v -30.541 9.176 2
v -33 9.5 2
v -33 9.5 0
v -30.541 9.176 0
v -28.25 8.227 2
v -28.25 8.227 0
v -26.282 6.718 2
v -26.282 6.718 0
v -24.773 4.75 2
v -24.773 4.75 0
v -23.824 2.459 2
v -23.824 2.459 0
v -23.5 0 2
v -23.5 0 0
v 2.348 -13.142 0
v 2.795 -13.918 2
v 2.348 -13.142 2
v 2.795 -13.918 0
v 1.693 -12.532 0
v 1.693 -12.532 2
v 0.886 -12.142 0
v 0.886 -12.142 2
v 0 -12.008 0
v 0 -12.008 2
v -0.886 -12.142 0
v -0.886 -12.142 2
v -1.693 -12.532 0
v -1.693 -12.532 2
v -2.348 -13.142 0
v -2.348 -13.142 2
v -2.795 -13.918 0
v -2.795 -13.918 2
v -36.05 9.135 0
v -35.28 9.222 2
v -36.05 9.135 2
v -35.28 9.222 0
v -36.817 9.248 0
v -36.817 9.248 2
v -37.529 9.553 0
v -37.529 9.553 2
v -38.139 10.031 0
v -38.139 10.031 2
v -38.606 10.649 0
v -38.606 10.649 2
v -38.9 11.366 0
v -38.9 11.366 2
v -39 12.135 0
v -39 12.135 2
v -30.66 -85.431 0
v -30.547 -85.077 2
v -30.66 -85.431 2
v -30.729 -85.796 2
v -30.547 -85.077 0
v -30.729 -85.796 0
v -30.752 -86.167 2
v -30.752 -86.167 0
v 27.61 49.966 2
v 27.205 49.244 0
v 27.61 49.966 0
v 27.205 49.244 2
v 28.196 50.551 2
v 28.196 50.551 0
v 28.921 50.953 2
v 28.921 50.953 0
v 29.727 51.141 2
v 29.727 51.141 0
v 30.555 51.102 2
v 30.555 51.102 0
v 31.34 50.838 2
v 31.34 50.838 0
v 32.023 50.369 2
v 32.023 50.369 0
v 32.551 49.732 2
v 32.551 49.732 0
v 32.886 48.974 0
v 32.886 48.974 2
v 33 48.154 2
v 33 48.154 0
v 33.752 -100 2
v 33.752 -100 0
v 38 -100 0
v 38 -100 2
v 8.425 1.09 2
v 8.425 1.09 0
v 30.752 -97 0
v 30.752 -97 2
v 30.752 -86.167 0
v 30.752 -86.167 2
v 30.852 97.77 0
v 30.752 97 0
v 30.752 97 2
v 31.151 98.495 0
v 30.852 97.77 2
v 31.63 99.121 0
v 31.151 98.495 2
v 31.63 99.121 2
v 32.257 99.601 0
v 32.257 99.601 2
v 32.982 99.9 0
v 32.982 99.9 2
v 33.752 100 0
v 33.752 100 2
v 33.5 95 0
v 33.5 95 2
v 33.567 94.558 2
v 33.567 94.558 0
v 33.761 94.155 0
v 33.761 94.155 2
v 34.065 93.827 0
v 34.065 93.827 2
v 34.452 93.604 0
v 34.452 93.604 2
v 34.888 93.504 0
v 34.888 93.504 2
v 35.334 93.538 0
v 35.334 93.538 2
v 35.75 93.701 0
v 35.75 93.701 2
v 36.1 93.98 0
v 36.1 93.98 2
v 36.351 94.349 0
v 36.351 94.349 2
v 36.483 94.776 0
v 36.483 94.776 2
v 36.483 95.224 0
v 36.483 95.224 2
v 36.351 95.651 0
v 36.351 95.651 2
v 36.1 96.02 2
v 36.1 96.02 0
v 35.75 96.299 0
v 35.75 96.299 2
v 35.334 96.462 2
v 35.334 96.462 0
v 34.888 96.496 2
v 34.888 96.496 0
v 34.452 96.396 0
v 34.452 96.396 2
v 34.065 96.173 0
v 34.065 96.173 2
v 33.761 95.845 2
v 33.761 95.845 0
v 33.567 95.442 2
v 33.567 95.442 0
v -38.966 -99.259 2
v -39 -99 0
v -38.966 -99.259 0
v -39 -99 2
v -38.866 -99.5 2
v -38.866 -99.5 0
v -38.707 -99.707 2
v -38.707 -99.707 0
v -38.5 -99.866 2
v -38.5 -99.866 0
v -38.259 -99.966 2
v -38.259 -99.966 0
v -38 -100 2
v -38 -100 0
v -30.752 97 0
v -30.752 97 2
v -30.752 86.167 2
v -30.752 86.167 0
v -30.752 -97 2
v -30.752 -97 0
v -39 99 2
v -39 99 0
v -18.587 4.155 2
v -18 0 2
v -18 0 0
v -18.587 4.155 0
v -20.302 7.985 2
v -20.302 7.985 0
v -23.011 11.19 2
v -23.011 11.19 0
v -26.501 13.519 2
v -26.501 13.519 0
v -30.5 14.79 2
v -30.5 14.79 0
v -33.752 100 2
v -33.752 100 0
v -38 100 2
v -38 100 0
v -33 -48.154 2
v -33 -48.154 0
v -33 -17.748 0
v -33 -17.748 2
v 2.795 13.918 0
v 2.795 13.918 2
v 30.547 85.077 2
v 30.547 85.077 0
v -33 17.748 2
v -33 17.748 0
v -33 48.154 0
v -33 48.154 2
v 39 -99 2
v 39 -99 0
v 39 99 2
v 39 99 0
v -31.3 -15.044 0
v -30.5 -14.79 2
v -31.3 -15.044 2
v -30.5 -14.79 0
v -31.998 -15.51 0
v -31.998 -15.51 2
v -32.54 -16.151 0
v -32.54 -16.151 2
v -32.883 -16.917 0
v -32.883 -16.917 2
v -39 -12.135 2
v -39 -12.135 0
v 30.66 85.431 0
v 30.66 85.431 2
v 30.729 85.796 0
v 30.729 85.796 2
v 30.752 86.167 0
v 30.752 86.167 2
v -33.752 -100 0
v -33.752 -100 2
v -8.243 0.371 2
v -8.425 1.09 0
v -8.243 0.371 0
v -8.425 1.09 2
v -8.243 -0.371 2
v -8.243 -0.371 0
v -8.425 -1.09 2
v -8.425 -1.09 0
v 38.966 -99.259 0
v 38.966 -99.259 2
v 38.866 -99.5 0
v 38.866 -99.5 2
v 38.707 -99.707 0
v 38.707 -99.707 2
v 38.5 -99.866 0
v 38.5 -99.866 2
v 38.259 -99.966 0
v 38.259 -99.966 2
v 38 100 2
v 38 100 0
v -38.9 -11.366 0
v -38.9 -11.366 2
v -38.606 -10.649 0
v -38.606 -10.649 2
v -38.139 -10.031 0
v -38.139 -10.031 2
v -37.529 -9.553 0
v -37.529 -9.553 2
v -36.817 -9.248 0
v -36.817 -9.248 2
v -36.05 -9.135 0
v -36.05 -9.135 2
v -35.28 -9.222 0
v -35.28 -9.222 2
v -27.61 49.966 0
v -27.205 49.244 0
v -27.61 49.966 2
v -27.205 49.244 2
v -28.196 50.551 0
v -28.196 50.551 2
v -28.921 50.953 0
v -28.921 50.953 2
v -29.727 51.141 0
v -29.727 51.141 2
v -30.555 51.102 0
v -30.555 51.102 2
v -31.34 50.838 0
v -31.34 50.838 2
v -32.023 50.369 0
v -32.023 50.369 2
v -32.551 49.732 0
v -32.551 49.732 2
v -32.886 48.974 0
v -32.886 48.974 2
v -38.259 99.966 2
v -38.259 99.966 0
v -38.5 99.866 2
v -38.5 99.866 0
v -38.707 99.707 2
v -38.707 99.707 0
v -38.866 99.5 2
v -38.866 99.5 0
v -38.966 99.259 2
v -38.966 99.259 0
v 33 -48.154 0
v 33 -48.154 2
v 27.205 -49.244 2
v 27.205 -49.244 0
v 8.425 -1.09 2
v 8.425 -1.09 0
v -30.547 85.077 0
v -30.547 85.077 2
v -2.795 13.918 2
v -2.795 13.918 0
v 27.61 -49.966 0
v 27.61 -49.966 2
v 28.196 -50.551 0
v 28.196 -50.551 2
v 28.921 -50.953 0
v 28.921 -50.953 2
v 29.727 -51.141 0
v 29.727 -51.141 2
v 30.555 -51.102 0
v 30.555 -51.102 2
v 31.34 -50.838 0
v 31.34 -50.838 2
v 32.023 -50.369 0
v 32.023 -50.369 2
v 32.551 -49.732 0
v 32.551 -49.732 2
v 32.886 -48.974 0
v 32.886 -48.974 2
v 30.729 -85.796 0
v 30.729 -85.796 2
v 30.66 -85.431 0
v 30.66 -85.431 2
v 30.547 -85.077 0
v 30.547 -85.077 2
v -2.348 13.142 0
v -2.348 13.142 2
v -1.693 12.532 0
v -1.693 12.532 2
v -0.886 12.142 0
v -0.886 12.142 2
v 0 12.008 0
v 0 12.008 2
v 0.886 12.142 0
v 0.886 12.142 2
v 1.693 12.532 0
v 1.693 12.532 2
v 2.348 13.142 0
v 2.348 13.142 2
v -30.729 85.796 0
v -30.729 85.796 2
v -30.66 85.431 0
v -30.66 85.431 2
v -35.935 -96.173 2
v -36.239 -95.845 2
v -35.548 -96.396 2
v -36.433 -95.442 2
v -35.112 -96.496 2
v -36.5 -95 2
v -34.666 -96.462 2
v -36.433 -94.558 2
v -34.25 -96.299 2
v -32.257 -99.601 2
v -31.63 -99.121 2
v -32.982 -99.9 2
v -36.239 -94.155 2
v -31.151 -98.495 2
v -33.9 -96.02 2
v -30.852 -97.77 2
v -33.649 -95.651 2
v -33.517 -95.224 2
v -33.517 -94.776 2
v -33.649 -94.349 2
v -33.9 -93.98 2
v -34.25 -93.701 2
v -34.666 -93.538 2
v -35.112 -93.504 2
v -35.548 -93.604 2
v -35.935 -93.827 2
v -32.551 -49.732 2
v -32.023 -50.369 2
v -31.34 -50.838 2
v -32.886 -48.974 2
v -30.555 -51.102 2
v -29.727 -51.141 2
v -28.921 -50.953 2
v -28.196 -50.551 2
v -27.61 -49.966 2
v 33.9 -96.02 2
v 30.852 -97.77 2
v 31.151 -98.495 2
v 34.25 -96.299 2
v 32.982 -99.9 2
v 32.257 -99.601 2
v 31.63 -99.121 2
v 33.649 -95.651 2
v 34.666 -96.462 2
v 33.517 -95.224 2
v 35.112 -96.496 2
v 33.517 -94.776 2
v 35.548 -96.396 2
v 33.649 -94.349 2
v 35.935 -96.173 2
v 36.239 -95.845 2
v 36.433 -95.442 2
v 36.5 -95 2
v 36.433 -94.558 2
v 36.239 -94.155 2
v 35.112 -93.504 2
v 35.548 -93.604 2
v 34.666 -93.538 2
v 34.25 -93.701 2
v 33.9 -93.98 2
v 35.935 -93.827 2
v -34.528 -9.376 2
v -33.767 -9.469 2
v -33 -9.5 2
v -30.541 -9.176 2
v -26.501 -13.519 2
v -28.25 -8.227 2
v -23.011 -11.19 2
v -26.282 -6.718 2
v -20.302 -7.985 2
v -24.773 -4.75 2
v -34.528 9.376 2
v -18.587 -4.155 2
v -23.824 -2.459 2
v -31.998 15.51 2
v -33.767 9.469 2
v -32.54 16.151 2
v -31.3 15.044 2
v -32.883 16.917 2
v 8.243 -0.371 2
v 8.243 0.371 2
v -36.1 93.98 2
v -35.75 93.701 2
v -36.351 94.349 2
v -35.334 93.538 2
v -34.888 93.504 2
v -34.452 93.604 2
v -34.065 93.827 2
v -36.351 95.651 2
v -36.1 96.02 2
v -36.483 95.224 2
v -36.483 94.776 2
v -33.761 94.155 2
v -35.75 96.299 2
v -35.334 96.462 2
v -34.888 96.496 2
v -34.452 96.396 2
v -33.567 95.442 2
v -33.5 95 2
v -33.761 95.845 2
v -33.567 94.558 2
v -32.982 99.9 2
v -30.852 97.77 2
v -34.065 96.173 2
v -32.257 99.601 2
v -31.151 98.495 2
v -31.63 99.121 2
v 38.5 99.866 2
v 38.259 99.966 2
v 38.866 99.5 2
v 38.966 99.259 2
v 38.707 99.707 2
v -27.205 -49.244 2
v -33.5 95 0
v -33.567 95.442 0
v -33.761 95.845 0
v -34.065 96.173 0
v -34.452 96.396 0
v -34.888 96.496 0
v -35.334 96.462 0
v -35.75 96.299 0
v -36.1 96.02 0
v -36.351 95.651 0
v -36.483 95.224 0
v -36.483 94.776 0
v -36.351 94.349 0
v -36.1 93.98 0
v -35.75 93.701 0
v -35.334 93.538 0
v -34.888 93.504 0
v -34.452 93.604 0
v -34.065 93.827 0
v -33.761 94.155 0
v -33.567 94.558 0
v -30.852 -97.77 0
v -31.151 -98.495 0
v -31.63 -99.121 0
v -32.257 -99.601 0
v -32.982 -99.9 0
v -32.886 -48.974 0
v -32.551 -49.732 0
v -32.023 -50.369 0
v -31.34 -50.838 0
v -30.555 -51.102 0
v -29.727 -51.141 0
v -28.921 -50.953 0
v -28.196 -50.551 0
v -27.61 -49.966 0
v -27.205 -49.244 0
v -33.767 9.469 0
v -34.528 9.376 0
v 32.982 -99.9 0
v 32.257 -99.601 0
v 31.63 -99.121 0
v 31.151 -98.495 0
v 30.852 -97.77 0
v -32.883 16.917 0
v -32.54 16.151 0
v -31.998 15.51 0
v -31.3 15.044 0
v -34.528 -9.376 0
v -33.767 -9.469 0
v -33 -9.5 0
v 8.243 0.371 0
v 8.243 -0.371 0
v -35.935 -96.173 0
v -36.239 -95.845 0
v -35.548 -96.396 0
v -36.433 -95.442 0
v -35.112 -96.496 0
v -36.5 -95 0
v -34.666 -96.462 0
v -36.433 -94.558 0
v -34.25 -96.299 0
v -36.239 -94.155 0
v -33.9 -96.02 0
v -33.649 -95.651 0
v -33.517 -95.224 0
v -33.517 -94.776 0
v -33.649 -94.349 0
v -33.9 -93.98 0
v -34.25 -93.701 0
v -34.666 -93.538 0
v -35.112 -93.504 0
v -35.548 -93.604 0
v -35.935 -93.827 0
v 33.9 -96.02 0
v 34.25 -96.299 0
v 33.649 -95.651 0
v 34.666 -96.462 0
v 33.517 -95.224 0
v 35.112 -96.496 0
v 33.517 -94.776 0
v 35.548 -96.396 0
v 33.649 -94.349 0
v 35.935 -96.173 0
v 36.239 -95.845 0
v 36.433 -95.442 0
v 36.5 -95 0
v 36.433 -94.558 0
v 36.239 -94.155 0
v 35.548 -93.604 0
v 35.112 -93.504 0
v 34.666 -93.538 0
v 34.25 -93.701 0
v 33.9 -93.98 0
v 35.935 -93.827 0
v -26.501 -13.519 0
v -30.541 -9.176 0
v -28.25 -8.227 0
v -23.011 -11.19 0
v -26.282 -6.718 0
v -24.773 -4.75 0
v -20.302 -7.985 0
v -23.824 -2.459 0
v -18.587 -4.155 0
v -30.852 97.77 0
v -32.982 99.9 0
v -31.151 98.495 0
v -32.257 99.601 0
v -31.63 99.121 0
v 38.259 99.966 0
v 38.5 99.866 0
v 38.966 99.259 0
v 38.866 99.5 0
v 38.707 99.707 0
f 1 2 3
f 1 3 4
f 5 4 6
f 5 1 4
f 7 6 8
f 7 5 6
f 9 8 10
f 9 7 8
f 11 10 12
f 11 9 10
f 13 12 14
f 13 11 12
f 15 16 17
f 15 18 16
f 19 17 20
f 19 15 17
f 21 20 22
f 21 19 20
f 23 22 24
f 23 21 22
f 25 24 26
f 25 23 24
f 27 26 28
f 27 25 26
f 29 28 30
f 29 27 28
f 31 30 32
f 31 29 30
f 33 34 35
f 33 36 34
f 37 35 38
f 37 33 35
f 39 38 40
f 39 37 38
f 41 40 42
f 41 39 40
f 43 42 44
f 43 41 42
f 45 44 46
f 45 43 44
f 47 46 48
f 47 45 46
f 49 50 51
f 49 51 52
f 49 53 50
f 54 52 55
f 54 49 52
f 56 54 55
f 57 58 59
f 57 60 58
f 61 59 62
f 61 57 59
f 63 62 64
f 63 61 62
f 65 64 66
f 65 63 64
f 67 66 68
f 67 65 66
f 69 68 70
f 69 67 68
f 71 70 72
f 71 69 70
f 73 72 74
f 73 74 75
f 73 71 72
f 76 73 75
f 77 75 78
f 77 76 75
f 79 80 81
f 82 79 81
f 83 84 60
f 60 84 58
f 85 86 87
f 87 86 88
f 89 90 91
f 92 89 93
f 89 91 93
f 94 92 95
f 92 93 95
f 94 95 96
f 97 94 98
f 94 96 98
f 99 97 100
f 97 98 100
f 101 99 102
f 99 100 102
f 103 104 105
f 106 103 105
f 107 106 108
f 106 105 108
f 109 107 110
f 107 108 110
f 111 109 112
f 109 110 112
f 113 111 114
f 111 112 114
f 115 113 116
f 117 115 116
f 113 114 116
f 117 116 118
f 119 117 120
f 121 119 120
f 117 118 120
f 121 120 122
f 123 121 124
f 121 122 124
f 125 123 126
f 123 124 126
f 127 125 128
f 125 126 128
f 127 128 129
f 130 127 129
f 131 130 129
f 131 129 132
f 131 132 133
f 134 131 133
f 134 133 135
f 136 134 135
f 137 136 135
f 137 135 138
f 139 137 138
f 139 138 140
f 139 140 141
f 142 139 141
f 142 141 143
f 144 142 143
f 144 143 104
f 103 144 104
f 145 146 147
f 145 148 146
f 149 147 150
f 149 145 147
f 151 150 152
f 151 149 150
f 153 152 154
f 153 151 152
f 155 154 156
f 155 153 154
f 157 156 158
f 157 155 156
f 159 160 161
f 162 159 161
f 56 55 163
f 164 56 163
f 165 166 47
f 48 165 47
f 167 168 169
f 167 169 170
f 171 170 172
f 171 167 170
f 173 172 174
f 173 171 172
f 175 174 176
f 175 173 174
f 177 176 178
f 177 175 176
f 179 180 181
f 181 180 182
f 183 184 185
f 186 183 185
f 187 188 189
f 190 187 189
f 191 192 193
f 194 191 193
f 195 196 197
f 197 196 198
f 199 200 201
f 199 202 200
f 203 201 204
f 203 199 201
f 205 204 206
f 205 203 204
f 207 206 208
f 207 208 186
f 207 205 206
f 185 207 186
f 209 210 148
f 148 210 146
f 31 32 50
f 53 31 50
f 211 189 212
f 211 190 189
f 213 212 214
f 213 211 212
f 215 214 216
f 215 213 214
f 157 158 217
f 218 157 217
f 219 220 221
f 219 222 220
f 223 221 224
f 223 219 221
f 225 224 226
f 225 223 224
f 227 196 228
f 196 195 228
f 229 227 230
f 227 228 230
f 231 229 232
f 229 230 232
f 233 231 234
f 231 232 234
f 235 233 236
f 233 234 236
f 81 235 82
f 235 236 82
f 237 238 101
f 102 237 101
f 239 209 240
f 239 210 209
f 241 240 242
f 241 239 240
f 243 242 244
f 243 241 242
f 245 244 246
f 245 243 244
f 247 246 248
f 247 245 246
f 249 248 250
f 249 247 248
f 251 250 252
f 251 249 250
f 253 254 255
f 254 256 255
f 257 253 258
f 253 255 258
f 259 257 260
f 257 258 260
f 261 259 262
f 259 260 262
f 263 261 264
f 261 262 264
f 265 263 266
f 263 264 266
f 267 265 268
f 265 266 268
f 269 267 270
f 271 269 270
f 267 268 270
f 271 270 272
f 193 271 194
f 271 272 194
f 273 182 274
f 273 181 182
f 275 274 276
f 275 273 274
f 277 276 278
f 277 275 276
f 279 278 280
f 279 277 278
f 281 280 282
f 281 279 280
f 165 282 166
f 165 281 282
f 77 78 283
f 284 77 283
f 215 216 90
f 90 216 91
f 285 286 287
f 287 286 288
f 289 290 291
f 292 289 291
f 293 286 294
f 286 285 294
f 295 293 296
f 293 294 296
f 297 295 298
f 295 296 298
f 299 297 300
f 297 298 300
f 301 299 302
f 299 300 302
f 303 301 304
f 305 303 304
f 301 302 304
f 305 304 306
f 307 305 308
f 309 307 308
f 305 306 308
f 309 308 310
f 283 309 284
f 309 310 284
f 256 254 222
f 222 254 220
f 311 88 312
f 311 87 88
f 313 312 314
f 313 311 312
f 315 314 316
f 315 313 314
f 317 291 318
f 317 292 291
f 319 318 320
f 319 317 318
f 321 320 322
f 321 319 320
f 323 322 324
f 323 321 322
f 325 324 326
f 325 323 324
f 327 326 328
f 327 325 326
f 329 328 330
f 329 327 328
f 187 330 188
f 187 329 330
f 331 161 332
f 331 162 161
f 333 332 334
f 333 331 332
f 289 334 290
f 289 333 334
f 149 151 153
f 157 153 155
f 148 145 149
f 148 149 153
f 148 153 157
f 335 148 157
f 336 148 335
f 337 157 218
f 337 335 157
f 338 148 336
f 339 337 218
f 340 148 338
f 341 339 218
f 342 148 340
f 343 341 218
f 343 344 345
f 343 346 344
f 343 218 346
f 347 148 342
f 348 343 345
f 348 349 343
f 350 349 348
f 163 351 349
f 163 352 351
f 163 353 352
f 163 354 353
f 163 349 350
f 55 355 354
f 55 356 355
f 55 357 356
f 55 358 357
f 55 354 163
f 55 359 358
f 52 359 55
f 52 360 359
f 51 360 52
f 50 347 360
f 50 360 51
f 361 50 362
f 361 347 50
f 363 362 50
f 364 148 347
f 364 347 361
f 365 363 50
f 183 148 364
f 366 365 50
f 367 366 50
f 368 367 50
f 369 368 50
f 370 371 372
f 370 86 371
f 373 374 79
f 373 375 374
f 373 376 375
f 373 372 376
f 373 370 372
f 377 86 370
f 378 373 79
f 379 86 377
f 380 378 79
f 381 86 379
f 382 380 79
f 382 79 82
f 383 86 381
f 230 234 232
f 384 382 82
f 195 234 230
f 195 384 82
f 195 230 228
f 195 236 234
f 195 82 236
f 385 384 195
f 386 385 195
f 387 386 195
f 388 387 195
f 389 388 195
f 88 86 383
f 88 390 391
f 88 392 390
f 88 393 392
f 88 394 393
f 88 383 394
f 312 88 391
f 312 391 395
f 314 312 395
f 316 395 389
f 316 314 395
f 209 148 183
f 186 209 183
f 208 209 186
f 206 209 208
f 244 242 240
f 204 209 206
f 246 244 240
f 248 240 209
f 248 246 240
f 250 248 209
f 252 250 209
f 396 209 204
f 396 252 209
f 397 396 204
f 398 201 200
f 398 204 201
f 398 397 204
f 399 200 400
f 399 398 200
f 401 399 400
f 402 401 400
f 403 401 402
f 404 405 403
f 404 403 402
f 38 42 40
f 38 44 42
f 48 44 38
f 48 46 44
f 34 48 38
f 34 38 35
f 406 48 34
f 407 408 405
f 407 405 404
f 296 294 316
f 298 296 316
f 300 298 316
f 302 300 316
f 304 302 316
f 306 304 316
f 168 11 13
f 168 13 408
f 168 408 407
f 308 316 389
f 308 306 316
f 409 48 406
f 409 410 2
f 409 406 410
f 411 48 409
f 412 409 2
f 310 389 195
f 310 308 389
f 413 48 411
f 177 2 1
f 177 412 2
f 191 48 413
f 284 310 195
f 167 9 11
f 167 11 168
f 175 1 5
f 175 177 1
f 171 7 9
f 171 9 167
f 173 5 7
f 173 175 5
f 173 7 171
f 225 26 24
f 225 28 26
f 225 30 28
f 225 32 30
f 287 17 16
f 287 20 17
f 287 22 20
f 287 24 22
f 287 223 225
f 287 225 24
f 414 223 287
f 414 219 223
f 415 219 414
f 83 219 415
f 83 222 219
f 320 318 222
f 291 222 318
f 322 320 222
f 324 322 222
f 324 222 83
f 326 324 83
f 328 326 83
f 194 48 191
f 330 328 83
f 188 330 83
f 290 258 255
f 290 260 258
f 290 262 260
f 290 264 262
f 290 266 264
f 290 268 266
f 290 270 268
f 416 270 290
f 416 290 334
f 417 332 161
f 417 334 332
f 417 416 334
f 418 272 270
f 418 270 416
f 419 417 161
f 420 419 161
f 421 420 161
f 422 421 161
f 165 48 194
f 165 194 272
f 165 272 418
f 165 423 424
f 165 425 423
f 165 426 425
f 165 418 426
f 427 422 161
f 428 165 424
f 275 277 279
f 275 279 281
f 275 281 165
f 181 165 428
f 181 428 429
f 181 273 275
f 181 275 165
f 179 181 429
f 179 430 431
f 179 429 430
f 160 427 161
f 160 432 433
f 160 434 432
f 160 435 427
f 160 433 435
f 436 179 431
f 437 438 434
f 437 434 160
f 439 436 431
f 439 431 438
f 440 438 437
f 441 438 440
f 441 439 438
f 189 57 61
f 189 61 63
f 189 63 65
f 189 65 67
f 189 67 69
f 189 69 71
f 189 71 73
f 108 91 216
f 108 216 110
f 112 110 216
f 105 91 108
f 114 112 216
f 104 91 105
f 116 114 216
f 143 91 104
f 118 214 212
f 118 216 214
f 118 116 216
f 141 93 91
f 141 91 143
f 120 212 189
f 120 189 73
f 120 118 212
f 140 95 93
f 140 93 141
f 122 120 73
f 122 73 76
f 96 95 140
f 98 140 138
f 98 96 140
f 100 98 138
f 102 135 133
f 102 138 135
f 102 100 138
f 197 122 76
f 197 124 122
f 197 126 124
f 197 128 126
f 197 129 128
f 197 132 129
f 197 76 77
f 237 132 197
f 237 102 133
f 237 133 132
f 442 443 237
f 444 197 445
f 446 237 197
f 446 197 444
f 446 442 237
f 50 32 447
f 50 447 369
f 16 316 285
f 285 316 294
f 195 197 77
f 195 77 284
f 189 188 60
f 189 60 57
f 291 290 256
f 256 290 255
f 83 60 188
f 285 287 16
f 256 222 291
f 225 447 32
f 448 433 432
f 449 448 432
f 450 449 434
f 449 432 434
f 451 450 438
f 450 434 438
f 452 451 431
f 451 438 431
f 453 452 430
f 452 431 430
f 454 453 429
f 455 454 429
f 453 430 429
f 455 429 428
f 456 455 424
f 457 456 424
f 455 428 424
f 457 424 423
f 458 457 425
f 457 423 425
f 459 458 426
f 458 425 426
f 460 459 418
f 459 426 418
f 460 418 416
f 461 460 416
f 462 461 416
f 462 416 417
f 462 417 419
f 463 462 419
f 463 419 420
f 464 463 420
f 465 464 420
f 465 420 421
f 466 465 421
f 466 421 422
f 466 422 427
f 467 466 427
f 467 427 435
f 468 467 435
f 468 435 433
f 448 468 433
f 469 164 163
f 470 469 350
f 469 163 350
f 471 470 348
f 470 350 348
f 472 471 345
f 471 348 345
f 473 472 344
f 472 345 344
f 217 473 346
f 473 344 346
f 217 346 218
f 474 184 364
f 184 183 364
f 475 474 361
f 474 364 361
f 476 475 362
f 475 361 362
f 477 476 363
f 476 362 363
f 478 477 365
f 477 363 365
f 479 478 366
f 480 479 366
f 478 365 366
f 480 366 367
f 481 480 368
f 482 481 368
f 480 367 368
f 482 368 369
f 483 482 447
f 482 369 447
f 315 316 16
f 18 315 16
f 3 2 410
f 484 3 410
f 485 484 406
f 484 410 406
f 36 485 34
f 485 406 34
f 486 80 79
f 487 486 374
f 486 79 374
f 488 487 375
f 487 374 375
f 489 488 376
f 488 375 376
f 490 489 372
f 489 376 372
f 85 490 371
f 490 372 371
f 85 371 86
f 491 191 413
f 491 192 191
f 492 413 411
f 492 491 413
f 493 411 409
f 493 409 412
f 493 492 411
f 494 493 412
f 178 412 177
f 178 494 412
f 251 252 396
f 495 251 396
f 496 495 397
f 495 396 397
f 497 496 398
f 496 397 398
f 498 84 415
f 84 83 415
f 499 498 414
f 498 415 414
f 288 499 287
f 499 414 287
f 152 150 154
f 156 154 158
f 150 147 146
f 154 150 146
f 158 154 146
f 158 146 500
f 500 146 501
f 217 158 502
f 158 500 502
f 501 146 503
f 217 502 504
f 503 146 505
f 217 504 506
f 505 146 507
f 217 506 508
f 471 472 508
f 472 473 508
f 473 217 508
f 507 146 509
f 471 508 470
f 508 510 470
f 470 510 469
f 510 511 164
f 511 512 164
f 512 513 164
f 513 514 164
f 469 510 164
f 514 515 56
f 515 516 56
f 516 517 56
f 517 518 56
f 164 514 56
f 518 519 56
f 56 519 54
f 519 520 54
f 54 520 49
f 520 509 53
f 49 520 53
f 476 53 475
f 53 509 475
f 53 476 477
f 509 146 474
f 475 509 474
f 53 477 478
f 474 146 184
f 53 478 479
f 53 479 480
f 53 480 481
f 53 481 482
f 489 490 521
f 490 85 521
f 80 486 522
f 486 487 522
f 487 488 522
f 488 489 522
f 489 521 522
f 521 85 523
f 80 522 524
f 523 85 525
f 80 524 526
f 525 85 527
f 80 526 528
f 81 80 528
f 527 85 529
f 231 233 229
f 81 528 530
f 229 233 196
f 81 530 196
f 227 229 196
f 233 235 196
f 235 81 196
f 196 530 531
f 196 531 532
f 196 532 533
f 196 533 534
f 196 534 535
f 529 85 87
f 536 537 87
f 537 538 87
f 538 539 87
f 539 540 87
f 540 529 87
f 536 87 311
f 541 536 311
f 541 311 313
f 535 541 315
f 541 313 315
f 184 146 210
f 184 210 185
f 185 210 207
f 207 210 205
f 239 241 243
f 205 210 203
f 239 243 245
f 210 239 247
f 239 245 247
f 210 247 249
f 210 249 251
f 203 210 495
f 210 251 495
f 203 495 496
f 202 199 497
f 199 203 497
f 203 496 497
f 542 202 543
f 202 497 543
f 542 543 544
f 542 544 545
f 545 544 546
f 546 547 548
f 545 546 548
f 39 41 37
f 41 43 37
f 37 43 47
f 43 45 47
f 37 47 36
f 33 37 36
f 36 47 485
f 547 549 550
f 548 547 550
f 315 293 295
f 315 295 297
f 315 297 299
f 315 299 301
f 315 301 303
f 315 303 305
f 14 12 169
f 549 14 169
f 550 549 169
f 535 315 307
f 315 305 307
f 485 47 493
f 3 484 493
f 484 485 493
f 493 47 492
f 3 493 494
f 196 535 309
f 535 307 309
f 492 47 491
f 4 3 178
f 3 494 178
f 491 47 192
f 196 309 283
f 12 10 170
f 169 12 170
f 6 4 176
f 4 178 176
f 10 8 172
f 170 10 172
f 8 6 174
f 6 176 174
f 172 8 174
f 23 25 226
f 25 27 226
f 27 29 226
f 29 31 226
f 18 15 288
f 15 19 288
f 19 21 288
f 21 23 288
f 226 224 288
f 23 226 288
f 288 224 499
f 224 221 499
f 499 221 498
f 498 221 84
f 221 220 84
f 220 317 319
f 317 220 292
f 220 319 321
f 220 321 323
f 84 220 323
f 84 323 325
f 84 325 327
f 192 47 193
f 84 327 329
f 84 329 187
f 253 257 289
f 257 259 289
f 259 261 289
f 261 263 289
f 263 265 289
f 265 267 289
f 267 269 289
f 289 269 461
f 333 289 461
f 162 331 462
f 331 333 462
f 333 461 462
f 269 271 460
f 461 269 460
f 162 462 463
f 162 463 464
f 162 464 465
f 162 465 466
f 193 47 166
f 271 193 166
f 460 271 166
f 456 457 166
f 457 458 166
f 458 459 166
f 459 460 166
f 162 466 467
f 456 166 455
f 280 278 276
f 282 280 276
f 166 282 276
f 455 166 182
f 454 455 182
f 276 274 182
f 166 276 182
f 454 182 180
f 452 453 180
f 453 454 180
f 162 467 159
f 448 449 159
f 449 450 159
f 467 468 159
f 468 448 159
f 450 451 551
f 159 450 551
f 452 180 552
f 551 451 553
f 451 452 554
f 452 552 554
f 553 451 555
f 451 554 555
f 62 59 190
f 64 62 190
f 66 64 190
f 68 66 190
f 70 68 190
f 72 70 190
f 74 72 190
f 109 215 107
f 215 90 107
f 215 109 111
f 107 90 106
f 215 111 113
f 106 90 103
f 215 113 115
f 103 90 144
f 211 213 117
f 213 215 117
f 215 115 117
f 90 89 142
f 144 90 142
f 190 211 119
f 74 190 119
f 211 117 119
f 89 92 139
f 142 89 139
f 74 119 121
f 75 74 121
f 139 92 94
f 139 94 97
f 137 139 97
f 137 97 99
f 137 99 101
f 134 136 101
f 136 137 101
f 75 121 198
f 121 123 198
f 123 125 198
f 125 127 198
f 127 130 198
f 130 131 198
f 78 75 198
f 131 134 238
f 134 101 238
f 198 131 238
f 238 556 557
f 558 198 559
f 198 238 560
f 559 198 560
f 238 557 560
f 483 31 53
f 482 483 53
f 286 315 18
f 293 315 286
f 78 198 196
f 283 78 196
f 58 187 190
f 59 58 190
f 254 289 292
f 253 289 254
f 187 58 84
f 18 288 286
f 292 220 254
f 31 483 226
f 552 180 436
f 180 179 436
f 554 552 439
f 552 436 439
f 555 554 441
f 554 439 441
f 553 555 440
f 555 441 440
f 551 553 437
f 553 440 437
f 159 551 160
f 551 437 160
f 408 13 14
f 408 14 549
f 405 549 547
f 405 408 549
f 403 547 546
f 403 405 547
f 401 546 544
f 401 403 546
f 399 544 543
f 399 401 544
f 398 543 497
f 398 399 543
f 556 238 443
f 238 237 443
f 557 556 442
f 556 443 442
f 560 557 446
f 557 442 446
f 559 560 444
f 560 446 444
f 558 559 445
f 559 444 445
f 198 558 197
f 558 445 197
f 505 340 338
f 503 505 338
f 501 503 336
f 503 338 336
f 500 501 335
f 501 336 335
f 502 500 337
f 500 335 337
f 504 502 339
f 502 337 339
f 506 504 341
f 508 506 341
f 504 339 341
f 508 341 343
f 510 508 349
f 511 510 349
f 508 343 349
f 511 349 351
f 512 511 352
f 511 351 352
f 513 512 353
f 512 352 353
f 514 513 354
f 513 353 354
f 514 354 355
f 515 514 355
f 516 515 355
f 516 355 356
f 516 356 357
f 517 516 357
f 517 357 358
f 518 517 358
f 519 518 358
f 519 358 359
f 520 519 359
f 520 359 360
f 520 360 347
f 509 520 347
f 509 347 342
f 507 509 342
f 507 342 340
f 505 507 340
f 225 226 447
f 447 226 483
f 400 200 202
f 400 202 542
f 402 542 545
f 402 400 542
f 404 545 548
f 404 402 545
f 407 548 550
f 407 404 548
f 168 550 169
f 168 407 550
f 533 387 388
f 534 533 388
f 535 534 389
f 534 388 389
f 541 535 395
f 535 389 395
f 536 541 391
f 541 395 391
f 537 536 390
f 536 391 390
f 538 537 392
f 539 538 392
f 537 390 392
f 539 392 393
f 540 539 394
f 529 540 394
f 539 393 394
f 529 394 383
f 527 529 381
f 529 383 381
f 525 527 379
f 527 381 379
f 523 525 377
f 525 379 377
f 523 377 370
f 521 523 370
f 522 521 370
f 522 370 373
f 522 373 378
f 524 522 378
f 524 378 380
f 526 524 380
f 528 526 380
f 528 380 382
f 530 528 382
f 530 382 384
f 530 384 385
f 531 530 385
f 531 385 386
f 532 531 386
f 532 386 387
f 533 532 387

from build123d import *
from build123d.topology import SkipClean

# Parameters (mm, degrees)
EXTRUDE_1_DEPTH     = 2
SKETCH_4_R          = 1.5
CUT_EXTRUDE_3_DEPTH = 108.354552768
FILLET_4_R          = 1
CUT_EXTRUDE_5_DEPTH = 108.354552768
FILLET_7_R          = 3
EXTRUDE_2_DEPTH     = 2
CUT_EXTRUDE_6_DEPTH = 108.354552899
FILLET_8_R          = 3


with BuildPart() as part:
    # 草图1 → 凸台-拉伸1 (new body)
    with BuildSketch(Plane.XY):
        Polygon((39, 79.487179487), (33, 64.102564103), (33, -64.102564103), (39, -79.487179487), align=None)
        Polygon((33, -64.102564103), (8, 0), (0, -20.512820513), (31, -100), (39, -100), (39, -79.487179487), align=None)
        Polygon((-31, -100), (0, -20.512820513), (-8, 0), (-33, -64.102564103), (-39, -79.487179487), (-39, -100), align=None)
        Polygon((-33, -64.102564103), (-33, 64.102564103), (-39, 79.487179487), (-39, -79.487179487), align=None)
        Polygon((0, -20.512820513), (8, 0), (0, 20.512820513), (-8, 0), align=None)
        Polygon((8, 0), (33, 64.102564103), (39, 79.487179487), (39, 100), (31, 100), (0, 20.512820513), align=None)
        Polygon((-8, 0), (0, 20.512820513), (-31, 100), (-39, 100), (-39, 79.487179487), (-33, 64.102564103), align=None)
    extrude(amount=EXTRUDE_1_DEPTH)

    # 草图4 → 切除-拉伸3 (cut, through all)
    with BuildSketch(Plane.XY.offset(2)):
        with Locations((-35, 95)):
            Circle(SKETCH_4_R)
        with Locations(Location((-35, -95, 0), (0, 0, 180))):
            Circle(SKETCH_4_R)
        with Locations((35, -95)):
            Circle(SKETCH_4_R)
        with Locations(Location((35, 95, 0), (0, 0, 180))):
            Circle(SKETCH_4_R)
    extrude(amount=-CUT_EXTRUDE_3_DEPTH, mode=Mode.SUBTRACT)

    # 圆角4
    fillet_4_edges = [part.edges().sort_by_distance(p)[0] for p in [
        (39, -100, 1),
        (31, -100, 1),
        (-31, -100, 1),
        (-39, -100, 1),
        (-39, 100, 1),
        (-31, 100, 1),
        (31, 100, 1),
        (39, 100, 1),
    ]]
    fillet(fillet_4_edges, radius=FILLET_4_R)

    # 草图6 → 切除-拉伸5 (cut, through all)
    with BuildSketch(Plane.XY.offset(2)):
        Polygon((-30.751704658, -85.602329726), (-30.751704658, -99.363345276), (0, -20.512820513), (30.751704658, -99.363345276), (30.751704658, -85.602329726), (0, -6.751804962), align=None)
        Polygon((30.751704658, 85.602329726), (30.751704658, 99.363345276), (0, 20.512820513), (-30.751704658, 99.363345276), (-30.751704658, 85.602329726), (0, 6.751804962), align=None)
    extrude(amount=-CUT_EXTRUDE_5_DEPTH, mode=Mode.SUBTRACT)

    # 圆角7
    fillet_7_edges = [part.edges().sort_by_distance(p)[0] for p in [
        (30.751704658, 85.602329726, 1),
        (0, 6.751804962, 1),
        (-30.751704658, 85.602329726, 1),
        (-30.751704658, 99.363345276, 1),
        (-30.751704658, -99.363345276, 1),
        (0, -6.751804962, 1),
        (30.751704658, -85.602329726, 1),
        (30.751704658, -99.363345276, 1),
        (30.751704658, 99.363345276, 1),
        (33, 64.102564103, 1),
        (33, -64.102564103, 1),
        (8, 0, 1),
        (-8, 0, 1),
        (-33, -64.102564103, 1),
        (-33, 64.102564103, 1),
        (-30.751704658, -85.602329726, 1),
    ]]
    fillet(fillet_7_edges, radius=FILLET_7_R)

    # 草图7 → 凸台-拉伸2 (add, through all)
    with BuildSketch(Plane.XY.offset(2)):
        with BuildLine():
            ThreePointArc((-33, 9.5), (-26.282485579, 6.717514421), (-23.5, 0))
            ThreePointArc((-23.5, 0), (-26.282485579, -6.717514421), (-33, -9.5))
            Line((-33, -9.5), (-33, -15))
            ThreePointArc((-33, -15), (-22.393398282, -10.606601718), (-18, 0))
            ThreePointArc((-18, 0), (-22.393398282, 10.606601718), (-33, 15))
            Line((-33, 15), (-33, 9.5))
        make_face()
    extrude(amount=-EXTRUDE_2_DEPTH)

    # 草图7<4> → 切除-拉伸6 (cut, through all)
    with SkipClean():  # the faces are left unmerged after this step: merging them gives an invalid solid
        with BuildSketch(Plane.XY.offset(2)):
            with BuildLine():
                Line((-33, -9.5), (-33, 9.5))
                ThreePointArc((-33, 9.5), (-36.184189901, 8.950471198), (-39, 7.365459931))
                Line((-39, 7.365459931), (-39, -7.365459931))
                ThreePointArc((-39, -7.365459931), (-36.184189901, -8.950471198), (-33, -9.5))
            make_face()
        extrude(amount=-CUT_EXTRUDE_6_DEPTH, mode=Mode.SUBTRACT)

    # 圆角8
    fillet_8_edges = [part.edges().sort_by_distance(p)[0] for p in [
        (-33, -15, 1),
        (-33, 15, 1),
        (-39, -7.365459931, 1),
        (-39, 7.365459931, 1),
    ]]
    fillet(fillet_8_edges, radius=FILLET_8_R)


solid = part.part
